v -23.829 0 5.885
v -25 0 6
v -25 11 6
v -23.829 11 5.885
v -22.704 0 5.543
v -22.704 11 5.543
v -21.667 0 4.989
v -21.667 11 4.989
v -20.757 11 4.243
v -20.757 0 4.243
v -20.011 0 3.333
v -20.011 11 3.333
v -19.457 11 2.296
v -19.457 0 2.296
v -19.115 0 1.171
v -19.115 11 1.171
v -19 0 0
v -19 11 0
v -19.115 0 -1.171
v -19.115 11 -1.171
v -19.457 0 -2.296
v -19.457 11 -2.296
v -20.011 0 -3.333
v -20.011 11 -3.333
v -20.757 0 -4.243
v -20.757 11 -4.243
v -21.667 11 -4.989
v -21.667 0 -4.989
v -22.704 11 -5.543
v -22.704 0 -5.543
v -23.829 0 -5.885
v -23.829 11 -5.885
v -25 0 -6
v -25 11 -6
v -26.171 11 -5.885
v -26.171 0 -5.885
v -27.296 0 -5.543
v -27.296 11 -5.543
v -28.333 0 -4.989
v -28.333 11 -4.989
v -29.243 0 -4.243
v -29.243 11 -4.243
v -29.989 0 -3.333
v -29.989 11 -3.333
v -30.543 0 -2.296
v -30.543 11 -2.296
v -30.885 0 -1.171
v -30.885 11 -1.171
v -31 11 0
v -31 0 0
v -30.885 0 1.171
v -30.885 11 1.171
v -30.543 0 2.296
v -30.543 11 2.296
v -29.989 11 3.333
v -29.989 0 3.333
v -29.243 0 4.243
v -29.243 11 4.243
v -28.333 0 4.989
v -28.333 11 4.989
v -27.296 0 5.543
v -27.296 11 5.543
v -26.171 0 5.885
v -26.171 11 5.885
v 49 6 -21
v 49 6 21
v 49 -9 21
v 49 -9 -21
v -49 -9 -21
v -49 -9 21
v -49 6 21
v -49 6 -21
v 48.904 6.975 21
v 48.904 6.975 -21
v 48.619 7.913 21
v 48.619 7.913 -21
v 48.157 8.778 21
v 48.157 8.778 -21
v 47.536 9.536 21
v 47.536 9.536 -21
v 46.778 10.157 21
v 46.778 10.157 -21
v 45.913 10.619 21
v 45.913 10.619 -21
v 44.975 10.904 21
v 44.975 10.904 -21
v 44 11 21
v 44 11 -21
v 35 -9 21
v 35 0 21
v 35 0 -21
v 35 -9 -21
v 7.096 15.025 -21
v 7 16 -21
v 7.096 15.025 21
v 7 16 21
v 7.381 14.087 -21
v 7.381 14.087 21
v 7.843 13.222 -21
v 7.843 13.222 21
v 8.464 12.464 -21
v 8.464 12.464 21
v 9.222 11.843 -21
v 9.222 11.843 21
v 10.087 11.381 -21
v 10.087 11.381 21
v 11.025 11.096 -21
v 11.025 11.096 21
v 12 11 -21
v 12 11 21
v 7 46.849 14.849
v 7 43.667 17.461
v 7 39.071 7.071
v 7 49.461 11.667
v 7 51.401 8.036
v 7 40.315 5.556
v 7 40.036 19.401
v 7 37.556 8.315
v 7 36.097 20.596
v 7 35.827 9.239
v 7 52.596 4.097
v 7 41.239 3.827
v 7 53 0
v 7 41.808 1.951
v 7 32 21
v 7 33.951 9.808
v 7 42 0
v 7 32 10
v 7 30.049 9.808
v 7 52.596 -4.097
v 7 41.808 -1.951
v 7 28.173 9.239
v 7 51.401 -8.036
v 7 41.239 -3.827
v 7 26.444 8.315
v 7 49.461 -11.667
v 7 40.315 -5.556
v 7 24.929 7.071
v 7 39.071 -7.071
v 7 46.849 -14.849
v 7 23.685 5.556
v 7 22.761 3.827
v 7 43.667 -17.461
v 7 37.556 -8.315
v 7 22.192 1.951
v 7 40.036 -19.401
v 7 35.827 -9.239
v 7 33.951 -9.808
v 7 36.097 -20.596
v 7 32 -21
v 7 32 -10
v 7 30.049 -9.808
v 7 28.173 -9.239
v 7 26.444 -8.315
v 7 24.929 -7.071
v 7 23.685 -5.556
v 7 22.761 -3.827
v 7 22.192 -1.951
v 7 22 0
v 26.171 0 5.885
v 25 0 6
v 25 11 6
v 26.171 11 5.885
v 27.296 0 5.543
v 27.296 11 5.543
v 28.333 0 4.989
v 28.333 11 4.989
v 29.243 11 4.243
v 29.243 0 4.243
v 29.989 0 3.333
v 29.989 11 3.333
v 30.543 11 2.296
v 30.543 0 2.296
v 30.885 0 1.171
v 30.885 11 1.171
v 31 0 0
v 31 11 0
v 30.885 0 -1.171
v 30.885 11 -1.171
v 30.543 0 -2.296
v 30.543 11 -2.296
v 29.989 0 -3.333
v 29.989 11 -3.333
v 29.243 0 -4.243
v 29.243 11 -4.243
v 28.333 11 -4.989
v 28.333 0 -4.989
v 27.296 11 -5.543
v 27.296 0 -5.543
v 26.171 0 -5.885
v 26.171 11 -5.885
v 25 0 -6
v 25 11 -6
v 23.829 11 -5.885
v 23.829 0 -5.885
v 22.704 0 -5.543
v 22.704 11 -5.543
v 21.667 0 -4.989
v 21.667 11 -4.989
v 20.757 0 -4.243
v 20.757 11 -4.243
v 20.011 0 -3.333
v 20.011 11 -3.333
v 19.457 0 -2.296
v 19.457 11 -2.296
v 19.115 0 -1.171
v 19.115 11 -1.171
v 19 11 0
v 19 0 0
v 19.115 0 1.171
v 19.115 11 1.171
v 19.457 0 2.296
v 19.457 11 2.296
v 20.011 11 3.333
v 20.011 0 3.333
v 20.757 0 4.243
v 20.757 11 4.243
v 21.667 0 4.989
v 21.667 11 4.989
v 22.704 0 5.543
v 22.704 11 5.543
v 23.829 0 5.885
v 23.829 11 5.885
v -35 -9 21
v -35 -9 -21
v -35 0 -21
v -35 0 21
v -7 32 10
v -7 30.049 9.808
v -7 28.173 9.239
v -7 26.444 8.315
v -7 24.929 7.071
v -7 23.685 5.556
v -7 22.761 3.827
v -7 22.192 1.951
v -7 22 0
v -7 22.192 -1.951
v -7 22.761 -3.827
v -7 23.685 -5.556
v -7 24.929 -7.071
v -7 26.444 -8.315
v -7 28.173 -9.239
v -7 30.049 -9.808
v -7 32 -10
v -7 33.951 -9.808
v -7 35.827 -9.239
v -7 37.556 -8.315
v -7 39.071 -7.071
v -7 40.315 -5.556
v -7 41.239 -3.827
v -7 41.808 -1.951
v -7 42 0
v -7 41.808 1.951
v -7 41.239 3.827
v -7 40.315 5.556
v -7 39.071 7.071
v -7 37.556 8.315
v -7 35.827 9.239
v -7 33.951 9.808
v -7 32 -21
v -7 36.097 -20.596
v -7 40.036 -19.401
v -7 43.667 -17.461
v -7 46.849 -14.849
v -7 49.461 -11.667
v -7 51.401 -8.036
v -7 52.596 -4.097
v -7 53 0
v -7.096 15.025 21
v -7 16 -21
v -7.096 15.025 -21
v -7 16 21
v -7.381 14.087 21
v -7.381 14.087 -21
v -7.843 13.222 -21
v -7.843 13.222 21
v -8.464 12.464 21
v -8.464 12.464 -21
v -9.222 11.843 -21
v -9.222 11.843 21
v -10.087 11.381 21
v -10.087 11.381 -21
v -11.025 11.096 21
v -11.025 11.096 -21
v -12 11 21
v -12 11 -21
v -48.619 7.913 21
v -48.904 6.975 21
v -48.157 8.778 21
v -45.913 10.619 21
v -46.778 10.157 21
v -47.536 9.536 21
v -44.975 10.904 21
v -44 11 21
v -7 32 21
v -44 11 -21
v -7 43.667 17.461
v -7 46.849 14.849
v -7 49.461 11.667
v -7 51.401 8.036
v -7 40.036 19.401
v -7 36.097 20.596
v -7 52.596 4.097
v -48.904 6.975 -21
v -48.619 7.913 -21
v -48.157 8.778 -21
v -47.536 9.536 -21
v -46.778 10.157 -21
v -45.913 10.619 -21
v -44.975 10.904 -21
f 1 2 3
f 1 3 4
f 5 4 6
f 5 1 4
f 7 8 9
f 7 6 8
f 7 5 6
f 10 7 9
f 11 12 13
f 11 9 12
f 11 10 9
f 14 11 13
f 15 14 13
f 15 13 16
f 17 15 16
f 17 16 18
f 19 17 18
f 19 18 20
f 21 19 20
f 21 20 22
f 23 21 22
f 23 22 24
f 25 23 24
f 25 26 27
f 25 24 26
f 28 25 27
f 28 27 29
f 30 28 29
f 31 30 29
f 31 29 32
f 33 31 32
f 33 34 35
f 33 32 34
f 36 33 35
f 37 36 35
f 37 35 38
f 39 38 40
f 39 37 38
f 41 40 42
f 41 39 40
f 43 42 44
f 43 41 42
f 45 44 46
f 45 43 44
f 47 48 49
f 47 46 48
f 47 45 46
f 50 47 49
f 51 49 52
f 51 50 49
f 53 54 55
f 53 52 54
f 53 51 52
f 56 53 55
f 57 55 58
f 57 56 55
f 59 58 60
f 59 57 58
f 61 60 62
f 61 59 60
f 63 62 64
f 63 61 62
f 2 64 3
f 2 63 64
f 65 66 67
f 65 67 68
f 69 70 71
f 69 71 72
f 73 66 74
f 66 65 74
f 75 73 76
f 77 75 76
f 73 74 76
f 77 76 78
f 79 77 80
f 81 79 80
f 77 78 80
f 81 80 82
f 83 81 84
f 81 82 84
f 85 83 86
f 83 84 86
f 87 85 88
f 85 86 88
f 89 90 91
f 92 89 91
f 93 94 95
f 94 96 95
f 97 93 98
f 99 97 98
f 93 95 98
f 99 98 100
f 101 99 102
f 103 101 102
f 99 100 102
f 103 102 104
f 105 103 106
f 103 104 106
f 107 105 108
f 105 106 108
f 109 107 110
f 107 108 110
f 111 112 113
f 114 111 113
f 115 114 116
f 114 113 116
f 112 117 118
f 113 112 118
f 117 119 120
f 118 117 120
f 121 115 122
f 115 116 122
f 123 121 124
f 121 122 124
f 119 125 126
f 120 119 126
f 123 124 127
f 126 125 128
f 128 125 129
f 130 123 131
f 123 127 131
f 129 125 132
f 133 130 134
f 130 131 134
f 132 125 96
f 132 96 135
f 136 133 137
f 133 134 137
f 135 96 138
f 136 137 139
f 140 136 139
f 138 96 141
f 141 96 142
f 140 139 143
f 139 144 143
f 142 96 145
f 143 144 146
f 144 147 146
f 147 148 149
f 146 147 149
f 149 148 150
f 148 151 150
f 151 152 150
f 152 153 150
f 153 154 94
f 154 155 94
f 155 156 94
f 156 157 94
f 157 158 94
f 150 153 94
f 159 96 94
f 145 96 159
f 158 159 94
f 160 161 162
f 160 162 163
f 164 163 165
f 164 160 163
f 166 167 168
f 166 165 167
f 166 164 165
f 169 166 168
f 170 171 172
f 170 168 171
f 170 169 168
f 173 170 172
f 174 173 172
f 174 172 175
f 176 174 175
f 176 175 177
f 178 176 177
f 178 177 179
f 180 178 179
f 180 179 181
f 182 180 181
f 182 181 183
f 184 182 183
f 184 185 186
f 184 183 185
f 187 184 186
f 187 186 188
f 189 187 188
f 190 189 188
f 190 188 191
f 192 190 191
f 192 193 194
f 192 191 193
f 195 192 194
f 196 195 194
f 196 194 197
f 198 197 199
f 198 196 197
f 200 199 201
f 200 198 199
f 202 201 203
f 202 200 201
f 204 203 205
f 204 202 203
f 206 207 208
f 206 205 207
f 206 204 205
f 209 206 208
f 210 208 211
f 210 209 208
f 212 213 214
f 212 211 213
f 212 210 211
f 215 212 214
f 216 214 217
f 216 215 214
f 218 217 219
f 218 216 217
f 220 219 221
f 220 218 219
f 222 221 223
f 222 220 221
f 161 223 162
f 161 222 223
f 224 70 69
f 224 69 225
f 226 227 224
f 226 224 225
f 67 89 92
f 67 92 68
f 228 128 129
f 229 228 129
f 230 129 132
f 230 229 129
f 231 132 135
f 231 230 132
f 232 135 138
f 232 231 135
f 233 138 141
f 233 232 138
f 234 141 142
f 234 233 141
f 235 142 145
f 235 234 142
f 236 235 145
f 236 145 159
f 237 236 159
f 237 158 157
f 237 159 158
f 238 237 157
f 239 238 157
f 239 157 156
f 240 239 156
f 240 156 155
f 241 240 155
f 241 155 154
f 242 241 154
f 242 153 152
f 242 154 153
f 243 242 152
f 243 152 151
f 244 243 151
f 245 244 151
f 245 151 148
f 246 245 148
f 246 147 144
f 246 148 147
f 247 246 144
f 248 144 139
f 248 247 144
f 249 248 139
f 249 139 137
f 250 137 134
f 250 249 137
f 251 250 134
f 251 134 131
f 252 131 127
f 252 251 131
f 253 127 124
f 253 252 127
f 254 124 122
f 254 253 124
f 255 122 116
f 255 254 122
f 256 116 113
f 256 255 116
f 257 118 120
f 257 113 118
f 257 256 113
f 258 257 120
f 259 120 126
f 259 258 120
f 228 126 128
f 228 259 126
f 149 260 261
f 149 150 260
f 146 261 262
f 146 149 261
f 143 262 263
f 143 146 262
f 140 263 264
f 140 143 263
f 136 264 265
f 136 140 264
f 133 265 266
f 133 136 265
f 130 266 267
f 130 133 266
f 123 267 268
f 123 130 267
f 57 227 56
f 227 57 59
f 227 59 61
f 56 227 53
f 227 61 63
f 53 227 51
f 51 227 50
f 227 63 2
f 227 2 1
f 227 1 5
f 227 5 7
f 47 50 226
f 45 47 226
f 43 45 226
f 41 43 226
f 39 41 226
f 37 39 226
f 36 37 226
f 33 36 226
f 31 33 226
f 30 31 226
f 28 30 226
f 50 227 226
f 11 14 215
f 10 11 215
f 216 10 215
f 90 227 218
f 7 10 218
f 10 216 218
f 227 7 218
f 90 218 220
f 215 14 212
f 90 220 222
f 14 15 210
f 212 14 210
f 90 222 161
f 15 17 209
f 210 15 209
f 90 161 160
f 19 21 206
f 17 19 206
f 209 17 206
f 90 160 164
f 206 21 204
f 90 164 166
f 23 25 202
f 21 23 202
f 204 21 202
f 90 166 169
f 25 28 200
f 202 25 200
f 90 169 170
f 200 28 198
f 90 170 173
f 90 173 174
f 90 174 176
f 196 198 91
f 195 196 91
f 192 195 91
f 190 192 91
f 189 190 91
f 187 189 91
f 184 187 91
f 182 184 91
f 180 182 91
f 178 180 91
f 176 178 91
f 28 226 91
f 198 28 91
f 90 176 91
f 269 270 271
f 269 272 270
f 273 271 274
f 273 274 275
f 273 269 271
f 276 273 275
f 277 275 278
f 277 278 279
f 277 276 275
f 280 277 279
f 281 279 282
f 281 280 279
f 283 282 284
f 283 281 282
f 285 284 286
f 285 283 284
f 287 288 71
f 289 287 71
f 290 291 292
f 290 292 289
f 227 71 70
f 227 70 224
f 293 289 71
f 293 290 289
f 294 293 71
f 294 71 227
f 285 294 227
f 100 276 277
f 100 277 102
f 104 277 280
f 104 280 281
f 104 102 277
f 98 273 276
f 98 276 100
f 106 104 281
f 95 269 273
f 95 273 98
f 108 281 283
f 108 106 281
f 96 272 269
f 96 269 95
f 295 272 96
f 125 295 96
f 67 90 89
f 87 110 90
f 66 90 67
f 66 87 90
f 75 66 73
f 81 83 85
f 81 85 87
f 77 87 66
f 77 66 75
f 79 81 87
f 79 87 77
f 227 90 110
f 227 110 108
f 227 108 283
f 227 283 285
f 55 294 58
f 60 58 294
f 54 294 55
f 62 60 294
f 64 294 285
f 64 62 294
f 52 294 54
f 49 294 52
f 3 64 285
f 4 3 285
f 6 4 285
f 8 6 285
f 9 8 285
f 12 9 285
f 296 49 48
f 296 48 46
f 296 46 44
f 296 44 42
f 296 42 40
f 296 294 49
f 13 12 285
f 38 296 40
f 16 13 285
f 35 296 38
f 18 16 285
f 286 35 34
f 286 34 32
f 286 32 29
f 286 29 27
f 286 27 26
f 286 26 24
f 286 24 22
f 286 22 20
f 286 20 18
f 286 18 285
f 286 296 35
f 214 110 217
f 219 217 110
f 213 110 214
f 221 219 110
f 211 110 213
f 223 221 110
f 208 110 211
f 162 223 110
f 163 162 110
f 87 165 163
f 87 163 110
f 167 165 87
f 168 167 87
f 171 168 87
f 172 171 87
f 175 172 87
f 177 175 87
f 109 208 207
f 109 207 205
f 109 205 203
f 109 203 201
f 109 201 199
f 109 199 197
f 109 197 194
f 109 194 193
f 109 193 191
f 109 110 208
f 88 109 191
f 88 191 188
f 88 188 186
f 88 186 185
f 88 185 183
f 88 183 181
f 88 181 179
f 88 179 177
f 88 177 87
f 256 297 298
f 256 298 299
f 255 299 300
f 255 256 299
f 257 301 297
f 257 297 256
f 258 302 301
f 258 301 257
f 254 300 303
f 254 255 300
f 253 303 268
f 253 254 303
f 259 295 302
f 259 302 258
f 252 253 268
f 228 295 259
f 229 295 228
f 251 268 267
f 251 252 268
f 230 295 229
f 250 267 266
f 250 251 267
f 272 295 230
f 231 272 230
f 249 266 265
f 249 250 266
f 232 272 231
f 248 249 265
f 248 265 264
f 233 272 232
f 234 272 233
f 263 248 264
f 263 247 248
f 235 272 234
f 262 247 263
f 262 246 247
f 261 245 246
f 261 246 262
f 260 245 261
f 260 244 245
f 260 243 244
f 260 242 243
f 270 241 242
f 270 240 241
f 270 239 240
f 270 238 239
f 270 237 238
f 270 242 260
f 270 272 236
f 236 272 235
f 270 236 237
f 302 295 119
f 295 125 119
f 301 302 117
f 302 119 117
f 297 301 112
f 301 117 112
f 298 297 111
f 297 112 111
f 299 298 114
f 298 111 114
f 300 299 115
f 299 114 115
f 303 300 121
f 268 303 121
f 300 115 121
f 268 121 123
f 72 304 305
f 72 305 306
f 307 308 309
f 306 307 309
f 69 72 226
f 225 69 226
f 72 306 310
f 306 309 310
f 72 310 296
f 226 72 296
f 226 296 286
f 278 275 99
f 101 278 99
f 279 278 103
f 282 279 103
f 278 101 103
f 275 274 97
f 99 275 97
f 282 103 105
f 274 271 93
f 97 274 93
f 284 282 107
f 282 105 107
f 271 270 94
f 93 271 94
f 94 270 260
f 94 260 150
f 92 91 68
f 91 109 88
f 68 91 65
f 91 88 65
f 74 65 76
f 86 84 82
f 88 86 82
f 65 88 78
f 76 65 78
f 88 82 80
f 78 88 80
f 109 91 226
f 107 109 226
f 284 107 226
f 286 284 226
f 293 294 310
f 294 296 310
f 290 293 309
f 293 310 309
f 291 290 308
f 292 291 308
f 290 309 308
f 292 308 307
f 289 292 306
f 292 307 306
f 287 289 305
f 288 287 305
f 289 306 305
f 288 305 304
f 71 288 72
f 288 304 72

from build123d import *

# Parameters (mm, degrees)
SKETCH2_W               = 98
SKETCH2_H               = 42
BOSS_EXTRUDE1_DEPTH     = 11
SKETCH3_W               = 14
SKETCH3_H               = 42
BOSS_EXTRUDE2_DEPTH     = 9
FILLET1_R               = 5
CUT_EXTRUDE1_DEPTH      = 55.433445601
CUT_EXTRUDE1_DEPTH_BACK = 55.433445601
SKETCH4_R               = 6
SKETCH5_W               = 14
SKETCH5_H               = 42
BOSS_EXTRUDE4_DEPTH     = 53
FILLET2_R               = 21
FILLET3_R               = 5
CUT_EXTRUDE2_DEPTH      = 76.173133499
CUT_EXTRUDE2_DEPTH_BACK = 76.173133499
SKETCH6_R               = 10


with BuildPart() as part:
    # Sketch2 → Boss-Extrude1 (new body)
    with BuildSketch(Plane(origin=(0, 0, 0), x_dir=(1, 0, 0), z_dir=(0, 1, 0))):
        Rectangle(SKETCH2_W, SKETCH2_H)
    extrude(amount=BOSS_EXTRUDE1_DEPTH)

    # Sketch3 → Boss-Extrude2 (add)
    with BuildSketch(Plane(origin=(0, 0, 0), x_dir=(1, 0, 0), z_dir=(0, 1, 0))):
        with Locations((42, 0)):
            Rectangle(SKETCH3_W, SKETCH3_H)
        with Locations((-42, 0)):
            Rectangle(SKETCH3_W, SKETCH3_H)
    extrude(amount=-BOSS_EXTRUDE2_DEPTH)

    # Fillet1
    fillet1_edges = [part.edges().sort_by_distance(p)[0] for p in [
        (-49, 11, 0),
        (49, 11, 0),
    ]]
    fillet(fillet1_edges, radius=FILLET1_R)

    # Sketch4 → Cut-Extrude1 (cut, two sides: drawn at the far end of the back side and taken through both)
    with BuildSketch(Plane(origin=(0, 0, 0), x_dir=(1, 0, 0), z_dir=(0, 1, 0)).offset(-CUT_EXTRUDE1_DEPTH_BACK)):
        with Locations(Location((-25, 0, 0), (0, 0, 270))):
            Circle(SKETCH4_R)
        with Locations(Location((25, 0, 0), (0, 0, 270))):
            Circle(SKETCH4_R)
    extrude(amount=CUT_EXTRUDE1_DEPTH + CUT_EXTRUDE1_DEPTH_BACK, mode=Mode.SUBTRACT)

    # Sketch5 → Boss-Extrude4 (add)
    with BuildSketch(Plane(origin=(0, 0, 0), x_dir=(1, 0, 0), z_dir=(0, 1, 0))):
        Rectangle(SKETCH5_W, SKETCH5_H)
    extrude(amount=BOSS_EXTRUDE4_DEPTH)

    # Fillet2
    fillet2_edges = [part.edges().sort_by_distance(p)[0] for p in [
        (0, 53, -21),
        (0, 53, 21),
    ]]
    fillet(fillet2_edges, radius=FILLET2_R - 0.0001)  # a hair under: the kernel refuses the full size

    # Fillet3
    fillet3_edges = [part.edges().sort_by_distance(p)[0] for p in [
        (7, 11, 0),
        (-7, 11, 0),
    ]]
    fillet(fillet3_edges, radius=FILLET3_R)

    # Sketch6 → Cut-Extrude2 (cut, two sides: drawn at the far end of the back side and taken through both)
    with BuildSketch(Plane(origin=(0, 0, 0), x_dir=(0, 0, -1), z_dir=(1, 0, 0)).offset(-CUT_EXTRUDE2_DEPTH_BACK)):
        with Locations(Location((0, 32, 0), (0, 0, 180))):
            Circle(SKETCH6_R)
    extrude(amount=CUT_EXTRUDE2_DEPTH + CUT_EXTRUDE2_DEPTH_BACK, mode=Mode.SUBTRACT)


solid = part.part
